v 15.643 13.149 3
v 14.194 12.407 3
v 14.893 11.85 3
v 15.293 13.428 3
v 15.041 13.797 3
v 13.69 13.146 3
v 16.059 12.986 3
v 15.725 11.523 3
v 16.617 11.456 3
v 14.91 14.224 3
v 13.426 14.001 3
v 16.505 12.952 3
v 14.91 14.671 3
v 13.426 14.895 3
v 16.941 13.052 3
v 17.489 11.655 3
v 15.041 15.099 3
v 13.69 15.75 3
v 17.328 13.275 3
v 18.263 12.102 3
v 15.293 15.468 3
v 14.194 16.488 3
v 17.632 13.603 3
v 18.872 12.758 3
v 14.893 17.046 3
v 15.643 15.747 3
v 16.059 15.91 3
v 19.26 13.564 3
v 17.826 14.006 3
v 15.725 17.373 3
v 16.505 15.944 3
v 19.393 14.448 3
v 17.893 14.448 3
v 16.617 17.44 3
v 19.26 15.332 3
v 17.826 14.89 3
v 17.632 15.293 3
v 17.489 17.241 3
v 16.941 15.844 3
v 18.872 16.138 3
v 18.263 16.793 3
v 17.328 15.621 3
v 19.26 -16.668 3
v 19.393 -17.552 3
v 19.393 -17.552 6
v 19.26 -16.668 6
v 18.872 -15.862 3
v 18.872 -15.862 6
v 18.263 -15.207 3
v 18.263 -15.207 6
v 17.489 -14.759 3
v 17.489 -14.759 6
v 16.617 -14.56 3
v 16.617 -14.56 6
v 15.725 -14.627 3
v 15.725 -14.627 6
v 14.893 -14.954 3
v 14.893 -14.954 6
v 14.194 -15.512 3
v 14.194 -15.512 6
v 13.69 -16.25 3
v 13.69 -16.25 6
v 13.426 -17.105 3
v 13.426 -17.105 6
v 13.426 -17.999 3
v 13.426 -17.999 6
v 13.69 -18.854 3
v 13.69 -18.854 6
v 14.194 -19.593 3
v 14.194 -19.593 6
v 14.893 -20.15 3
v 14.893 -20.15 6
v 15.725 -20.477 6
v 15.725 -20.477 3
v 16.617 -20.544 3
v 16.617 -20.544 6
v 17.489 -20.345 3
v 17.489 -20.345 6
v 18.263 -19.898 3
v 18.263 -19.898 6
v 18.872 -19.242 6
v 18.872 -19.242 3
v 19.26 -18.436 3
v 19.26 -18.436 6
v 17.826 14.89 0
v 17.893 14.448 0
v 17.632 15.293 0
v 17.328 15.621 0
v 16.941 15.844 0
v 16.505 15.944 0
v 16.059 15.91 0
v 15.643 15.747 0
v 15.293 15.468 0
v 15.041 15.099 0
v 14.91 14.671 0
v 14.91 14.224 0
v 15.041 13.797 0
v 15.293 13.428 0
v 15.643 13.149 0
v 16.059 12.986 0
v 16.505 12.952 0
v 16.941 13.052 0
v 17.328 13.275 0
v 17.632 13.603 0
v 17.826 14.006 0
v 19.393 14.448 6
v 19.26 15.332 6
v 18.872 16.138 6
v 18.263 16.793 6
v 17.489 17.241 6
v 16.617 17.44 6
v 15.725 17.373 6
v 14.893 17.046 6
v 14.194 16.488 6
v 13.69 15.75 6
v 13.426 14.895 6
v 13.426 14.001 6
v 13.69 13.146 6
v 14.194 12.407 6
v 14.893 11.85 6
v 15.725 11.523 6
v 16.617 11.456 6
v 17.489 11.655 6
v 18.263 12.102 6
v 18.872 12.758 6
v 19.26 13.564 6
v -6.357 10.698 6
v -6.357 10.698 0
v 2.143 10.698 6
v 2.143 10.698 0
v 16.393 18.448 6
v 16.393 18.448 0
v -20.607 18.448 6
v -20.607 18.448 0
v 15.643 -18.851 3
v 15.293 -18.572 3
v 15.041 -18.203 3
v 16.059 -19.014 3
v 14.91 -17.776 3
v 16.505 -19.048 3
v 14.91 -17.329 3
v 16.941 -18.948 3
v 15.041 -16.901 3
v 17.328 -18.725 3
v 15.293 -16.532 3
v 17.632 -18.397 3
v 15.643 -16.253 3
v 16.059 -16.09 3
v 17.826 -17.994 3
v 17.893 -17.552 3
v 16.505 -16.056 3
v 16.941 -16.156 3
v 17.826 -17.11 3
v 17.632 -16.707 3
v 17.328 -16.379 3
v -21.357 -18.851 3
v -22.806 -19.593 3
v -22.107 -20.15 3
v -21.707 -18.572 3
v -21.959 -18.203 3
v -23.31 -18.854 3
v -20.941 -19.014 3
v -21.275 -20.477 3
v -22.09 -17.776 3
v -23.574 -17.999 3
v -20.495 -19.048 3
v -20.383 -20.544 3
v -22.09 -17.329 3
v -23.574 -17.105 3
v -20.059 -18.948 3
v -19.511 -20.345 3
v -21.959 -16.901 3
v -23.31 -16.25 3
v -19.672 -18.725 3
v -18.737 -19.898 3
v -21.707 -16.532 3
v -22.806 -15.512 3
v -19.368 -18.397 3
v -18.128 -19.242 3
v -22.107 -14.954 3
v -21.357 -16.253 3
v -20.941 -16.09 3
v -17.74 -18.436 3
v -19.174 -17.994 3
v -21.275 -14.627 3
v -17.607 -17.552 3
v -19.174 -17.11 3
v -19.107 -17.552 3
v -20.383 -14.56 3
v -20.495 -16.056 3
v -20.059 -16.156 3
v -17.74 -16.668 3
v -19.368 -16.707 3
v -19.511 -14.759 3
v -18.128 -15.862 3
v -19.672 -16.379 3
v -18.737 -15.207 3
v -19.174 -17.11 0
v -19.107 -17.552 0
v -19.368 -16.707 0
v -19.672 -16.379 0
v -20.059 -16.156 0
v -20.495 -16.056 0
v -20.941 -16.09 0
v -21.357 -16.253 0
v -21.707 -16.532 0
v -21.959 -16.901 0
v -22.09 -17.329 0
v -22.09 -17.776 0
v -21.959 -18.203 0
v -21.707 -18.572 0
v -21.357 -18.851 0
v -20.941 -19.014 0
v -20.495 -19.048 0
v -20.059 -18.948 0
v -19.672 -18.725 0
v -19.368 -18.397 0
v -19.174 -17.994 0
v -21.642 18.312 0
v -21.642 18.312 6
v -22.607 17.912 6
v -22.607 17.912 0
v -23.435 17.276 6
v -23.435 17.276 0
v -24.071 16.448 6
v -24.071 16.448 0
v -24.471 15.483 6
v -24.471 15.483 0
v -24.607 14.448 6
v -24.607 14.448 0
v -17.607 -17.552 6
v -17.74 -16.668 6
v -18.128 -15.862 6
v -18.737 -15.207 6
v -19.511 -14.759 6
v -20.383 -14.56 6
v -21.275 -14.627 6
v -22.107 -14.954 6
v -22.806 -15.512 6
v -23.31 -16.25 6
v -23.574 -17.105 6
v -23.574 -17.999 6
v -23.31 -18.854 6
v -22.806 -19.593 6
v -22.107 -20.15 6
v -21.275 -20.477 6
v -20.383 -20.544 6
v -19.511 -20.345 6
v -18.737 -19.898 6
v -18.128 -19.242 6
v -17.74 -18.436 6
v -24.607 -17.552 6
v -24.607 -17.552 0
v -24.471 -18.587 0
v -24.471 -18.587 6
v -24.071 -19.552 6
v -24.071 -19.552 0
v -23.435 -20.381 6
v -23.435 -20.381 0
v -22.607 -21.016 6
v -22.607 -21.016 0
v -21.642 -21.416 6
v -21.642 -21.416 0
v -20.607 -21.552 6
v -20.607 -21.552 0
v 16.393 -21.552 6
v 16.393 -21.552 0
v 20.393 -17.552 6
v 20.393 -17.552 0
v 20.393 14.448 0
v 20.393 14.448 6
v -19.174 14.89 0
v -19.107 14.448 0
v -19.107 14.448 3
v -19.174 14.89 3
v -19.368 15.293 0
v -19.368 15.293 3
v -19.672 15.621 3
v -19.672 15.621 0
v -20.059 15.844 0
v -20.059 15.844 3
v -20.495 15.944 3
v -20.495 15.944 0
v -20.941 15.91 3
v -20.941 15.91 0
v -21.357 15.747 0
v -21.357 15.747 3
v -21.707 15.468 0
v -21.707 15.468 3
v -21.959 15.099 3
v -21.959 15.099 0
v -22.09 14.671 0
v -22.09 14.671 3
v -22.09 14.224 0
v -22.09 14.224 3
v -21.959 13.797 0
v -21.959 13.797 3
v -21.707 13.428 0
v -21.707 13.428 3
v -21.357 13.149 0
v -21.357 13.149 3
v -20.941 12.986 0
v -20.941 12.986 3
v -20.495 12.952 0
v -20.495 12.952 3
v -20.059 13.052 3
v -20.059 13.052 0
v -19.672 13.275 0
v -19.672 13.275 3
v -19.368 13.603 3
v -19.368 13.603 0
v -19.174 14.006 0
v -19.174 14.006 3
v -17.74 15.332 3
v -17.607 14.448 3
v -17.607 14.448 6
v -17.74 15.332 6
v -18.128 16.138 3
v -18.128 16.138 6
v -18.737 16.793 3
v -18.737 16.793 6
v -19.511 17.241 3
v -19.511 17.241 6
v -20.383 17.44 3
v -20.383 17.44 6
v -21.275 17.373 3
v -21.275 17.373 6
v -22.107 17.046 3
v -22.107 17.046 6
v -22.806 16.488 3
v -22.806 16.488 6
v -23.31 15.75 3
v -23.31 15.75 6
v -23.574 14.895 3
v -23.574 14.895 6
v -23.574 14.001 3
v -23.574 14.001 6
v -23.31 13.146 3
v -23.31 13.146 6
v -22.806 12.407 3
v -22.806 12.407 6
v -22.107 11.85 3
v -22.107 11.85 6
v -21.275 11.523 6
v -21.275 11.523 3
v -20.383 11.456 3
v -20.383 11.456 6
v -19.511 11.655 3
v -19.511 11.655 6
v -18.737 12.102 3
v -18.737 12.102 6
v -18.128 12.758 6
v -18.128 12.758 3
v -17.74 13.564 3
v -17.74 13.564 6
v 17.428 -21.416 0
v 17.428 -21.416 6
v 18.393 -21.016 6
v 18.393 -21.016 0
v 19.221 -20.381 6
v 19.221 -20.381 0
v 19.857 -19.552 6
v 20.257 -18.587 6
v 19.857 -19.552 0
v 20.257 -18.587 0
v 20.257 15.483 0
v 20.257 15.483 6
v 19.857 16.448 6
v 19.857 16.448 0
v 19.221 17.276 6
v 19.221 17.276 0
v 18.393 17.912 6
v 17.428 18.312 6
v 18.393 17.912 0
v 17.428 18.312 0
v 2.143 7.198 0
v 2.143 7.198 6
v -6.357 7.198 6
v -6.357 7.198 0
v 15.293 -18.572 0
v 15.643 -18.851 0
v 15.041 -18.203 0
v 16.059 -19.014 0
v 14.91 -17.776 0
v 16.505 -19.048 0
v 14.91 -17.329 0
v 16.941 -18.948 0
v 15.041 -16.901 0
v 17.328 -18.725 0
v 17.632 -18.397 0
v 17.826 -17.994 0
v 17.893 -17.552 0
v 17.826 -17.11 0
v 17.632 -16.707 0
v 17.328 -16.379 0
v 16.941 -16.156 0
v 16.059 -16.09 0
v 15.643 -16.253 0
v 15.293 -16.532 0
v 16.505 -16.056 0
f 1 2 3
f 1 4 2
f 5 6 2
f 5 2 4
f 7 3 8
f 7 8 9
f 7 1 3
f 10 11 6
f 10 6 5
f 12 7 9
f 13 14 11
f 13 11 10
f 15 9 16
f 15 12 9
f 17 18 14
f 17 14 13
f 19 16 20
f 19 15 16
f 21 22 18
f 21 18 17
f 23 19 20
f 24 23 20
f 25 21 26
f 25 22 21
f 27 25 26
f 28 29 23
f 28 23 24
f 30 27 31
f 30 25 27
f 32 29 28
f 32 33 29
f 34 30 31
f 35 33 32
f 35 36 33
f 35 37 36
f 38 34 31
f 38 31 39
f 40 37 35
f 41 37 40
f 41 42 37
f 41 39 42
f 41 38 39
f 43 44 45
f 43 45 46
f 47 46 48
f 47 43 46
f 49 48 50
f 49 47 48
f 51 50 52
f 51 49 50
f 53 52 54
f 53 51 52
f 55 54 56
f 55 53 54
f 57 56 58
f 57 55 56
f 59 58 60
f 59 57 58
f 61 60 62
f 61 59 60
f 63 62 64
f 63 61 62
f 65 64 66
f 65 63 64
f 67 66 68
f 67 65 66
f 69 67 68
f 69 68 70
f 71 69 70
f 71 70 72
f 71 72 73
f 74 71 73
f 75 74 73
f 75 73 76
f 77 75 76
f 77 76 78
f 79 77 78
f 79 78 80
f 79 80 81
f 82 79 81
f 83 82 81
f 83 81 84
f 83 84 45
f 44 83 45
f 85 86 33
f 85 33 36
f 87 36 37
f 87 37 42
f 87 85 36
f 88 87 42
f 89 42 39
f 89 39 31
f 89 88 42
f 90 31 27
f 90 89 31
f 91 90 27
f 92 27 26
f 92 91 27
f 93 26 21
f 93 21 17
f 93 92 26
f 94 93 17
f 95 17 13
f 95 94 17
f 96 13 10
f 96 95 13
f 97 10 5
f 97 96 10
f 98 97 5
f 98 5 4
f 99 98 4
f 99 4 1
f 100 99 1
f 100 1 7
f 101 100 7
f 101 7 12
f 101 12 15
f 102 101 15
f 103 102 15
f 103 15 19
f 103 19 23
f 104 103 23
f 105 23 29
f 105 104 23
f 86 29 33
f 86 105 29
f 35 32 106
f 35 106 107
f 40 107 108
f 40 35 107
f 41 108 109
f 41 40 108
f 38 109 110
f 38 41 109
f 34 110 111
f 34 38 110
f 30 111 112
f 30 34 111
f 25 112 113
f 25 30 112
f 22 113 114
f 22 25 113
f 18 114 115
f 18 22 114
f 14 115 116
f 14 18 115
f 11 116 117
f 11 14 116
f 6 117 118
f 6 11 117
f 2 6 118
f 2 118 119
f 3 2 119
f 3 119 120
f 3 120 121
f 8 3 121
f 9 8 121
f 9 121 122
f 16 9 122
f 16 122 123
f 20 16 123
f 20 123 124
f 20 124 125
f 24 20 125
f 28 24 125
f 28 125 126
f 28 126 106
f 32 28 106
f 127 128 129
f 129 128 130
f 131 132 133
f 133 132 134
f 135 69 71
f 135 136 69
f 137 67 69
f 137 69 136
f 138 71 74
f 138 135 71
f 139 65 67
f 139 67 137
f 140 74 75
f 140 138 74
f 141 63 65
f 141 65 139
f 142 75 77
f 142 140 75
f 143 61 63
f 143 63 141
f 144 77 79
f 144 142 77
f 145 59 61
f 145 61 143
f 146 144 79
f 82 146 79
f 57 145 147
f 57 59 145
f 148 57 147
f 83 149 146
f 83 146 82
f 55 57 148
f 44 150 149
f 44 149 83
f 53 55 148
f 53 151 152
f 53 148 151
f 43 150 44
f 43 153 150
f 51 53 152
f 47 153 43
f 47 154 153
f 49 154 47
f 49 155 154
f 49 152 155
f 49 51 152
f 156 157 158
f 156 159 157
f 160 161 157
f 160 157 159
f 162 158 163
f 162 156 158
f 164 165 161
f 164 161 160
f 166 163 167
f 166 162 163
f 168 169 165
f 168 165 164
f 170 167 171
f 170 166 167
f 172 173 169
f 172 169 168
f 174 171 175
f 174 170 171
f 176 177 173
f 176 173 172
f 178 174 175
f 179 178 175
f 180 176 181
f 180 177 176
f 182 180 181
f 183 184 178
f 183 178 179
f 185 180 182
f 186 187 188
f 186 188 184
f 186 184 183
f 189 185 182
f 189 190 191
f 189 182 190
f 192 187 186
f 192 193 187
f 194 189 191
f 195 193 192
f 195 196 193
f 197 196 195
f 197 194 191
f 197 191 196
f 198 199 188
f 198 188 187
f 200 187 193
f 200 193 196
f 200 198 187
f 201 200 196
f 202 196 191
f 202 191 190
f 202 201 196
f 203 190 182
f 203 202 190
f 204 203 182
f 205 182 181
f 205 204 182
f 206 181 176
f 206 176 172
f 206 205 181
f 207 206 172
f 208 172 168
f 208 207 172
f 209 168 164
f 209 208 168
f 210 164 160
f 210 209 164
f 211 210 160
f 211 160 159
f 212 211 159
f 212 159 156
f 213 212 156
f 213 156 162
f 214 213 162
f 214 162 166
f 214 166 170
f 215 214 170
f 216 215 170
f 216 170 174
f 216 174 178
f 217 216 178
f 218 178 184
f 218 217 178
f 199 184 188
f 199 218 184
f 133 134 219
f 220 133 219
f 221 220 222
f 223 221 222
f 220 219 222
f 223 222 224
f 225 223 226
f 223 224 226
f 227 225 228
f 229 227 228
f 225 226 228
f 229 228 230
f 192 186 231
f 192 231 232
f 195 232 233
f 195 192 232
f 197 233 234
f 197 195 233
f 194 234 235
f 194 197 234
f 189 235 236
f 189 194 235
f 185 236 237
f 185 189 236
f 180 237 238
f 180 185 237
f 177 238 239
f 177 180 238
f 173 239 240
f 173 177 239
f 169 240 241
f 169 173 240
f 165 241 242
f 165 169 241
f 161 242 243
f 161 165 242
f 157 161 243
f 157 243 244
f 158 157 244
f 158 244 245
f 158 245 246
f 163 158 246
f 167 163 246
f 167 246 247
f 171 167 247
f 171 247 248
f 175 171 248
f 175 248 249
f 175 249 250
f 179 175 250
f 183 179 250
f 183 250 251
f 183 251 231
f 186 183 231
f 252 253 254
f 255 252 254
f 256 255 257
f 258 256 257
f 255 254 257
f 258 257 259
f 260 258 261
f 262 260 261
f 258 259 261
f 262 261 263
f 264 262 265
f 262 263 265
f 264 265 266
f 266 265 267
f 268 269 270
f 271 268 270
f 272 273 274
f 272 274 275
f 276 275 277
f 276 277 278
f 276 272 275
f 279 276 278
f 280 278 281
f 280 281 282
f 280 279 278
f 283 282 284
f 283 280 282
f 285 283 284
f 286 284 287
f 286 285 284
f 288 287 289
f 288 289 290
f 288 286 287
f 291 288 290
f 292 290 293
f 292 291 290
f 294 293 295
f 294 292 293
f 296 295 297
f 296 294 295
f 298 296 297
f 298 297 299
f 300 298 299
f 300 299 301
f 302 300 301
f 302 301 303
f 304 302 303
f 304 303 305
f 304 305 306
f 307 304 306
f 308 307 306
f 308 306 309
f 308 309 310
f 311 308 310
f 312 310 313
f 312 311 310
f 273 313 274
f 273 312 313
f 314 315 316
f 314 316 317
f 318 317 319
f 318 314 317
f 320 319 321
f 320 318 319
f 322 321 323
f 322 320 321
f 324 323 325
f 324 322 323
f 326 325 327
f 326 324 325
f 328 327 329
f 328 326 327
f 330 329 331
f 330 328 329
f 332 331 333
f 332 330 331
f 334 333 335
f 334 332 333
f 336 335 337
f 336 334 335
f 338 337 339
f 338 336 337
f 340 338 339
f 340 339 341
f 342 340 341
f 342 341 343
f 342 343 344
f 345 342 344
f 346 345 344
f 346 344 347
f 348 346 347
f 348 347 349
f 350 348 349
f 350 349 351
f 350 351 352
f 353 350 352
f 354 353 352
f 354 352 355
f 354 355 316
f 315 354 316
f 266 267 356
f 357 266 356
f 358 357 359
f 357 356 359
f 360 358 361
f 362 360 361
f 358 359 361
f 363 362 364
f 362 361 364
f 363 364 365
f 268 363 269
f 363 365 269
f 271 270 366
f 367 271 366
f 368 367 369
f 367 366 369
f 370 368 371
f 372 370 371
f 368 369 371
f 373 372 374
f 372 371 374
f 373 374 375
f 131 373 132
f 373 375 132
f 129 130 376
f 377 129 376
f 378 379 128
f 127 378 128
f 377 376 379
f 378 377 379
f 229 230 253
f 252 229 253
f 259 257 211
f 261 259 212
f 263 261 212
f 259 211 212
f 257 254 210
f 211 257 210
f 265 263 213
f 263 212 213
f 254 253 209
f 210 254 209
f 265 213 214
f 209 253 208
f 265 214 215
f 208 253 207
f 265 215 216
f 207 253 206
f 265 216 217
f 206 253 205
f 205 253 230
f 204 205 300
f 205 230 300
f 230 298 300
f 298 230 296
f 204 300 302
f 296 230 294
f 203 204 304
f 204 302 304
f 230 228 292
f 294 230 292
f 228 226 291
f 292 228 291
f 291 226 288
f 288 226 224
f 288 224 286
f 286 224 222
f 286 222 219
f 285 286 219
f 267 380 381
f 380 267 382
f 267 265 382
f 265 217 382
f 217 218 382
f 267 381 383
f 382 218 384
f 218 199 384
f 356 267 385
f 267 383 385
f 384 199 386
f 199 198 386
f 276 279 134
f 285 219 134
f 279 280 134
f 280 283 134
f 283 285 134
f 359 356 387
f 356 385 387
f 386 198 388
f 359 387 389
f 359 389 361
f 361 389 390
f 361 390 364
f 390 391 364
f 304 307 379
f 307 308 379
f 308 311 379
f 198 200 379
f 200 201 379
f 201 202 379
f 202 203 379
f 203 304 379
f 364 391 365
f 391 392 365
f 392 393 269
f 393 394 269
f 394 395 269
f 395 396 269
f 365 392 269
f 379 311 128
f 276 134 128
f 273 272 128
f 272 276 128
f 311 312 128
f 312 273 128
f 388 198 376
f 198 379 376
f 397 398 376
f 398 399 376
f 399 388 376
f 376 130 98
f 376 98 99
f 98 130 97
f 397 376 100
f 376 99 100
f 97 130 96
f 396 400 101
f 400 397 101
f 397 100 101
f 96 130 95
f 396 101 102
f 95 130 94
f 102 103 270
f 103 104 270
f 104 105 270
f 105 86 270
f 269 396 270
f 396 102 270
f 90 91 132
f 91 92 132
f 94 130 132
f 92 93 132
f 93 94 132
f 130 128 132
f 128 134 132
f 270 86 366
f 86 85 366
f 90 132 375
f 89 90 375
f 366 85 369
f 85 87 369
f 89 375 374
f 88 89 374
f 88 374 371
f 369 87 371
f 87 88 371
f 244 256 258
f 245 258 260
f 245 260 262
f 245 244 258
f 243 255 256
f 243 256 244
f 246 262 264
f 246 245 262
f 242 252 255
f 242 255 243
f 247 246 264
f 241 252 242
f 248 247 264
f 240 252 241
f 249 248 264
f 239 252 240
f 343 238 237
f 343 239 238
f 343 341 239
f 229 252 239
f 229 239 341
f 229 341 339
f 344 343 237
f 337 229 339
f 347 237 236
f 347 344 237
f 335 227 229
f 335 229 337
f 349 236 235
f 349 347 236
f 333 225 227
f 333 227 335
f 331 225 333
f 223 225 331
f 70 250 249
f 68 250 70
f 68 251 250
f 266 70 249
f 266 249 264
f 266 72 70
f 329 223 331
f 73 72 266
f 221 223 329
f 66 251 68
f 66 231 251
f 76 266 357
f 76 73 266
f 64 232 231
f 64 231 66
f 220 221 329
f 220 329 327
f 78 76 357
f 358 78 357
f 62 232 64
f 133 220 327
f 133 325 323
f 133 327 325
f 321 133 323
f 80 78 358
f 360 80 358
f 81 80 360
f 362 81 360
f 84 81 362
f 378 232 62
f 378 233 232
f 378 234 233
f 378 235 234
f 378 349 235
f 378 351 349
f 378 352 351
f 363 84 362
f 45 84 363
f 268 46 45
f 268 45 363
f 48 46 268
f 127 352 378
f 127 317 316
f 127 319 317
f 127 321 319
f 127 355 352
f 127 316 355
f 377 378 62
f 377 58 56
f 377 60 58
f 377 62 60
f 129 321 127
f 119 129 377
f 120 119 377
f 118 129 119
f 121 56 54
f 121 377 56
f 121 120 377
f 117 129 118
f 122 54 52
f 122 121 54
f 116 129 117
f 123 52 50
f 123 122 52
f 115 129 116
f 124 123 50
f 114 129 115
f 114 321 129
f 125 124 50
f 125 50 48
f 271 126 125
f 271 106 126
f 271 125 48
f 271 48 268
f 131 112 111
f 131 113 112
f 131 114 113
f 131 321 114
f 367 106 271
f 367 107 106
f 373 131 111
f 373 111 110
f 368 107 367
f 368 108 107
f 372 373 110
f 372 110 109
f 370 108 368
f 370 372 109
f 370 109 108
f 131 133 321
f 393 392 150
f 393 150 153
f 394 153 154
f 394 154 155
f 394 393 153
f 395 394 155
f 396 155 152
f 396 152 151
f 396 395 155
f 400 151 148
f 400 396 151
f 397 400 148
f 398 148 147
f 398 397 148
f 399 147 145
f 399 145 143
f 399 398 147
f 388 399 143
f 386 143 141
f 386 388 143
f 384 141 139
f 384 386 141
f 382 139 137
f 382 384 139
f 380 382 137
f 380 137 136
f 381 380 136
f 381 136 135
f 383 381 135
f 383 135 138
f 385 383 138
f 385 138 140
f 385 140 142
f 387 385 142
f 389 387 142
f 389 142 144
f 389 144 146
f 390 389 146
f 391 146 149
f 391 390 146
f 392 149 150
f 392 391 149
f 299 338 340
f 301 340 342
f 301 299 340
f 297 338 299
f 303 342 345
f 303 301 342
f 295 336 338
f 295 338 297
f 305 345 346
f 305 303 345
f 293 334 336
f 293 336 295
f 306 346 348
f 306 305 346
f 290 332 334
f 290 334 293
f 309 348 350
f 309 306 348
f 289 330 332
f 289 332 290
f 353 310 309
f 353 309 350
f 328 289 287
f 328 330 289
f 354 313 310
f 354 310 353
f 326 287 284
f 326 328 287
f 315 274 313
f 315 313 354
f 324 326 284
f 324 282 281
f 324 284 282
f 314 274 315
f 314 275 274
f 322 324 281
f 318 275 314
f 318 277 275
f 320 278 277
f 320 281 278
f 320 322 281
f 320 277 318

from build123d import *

# Parameters (mm, degrees)
F0_R     = 3
F1_DEPTH = 6
F0_R_2   = 1.5
F2_DEPTH = 3


with BuildPart() as f1:
    # F0 (on Top) → F1 (new body)
    with BuildSketch(Plane.XY):
        with BuildLine():
            ThreePointArc((-20.607047, 18.447905), (-23.435474, 17.276332), (-24.607047, 14.447905))
            Line((-24.607047, 14.447905), (-24.607047, -17.552095))
            ThreePointArc((-24.607047, -17.552095), (-23.435474, -20.380522), (-20.607047, -21.552095))
            Line((-20.607047, -21.552095), (16.392953, -21.552095))
            ThreePointArc((16.392953, -21.552095), (19.22138, -20.380522), (20.392953, -17.552095))
            Line((20.392953, -17.552095), (20.392953, 14.447905))
            ThreePointArc((20.392953, 14.447905), (19.22138, 17.276332), (16.392953, 18.447905))
            Line((16.392953, 18.447905), (-20.607047, 18.447905))
        make_face()
        with Locations((-20.607047, -17.552095)):
            Circle(F0_R, mode=Mode.SUBTRACT)
        with Locations((16.392953, -17.552095)):
            Circle(F0_R, mode=Mode.SUBTRACT)
        Polygon((-14.357047, -13.802095), (-14.357047, 10.697905), (-6.357047, 10.697905), (2.142953, 10.697905), (10.142953, 10.697905), (10.142953, -13.802095), align=None, mode=Mode.SUBTRACT)
        with Locations((-20.607047, 14.447905)):
            Circle(F0_R, mode=Mode.SUBTRACT)
        with Locations((16.392953, 14.447905)):
            Circle(F0_R, mode=Mode.SUBTRACT)
        Polygon((-6.357047, 10.697905), (-14.357047, 10.697905), (-14.357047, -13.802095), (10.142953, -13.802095), (10.142953, 10.697905), (2.142953, 10.697905), (2.142953, 7.197905), (-6.357047, 7.197905), align=None)
    extrude(amount=F1_DEPTH)

    # F0 (on Top) → F2 (join)
    with BuildSketch(Plane.XY):
        with Locations((-20.607047, 14.447905)):
            Circle(F0_R)
        with Locations((-20.607047, 14.447905)):
            Circle(F0_R_2, mode=Mode.SUBTRACT)
        with Locations((16.392953, 14.447905)):
            Circle(F0_R)
        with Locations((16.392953, 14.447905)):
            Circle(F0_R_2, mode=Mode.SUBTRACT)
        with Locations((16.392953, -17.552095)):
            Circle(F0_R)
        with Locations((16.392953, -17.552095)):
            Circle(F0_R_2, mode=Mode.SUBTRACT)
        with Locations((-20.607047, -17.552095)):
            Circle(F0_R)
        with Locations((-20.607047, -17.552095)):
            Circle(F0_R_2, mode=Mode.SUBTRACT)
    extrude(amount=F2_DEPTH)


solid = f1.part
